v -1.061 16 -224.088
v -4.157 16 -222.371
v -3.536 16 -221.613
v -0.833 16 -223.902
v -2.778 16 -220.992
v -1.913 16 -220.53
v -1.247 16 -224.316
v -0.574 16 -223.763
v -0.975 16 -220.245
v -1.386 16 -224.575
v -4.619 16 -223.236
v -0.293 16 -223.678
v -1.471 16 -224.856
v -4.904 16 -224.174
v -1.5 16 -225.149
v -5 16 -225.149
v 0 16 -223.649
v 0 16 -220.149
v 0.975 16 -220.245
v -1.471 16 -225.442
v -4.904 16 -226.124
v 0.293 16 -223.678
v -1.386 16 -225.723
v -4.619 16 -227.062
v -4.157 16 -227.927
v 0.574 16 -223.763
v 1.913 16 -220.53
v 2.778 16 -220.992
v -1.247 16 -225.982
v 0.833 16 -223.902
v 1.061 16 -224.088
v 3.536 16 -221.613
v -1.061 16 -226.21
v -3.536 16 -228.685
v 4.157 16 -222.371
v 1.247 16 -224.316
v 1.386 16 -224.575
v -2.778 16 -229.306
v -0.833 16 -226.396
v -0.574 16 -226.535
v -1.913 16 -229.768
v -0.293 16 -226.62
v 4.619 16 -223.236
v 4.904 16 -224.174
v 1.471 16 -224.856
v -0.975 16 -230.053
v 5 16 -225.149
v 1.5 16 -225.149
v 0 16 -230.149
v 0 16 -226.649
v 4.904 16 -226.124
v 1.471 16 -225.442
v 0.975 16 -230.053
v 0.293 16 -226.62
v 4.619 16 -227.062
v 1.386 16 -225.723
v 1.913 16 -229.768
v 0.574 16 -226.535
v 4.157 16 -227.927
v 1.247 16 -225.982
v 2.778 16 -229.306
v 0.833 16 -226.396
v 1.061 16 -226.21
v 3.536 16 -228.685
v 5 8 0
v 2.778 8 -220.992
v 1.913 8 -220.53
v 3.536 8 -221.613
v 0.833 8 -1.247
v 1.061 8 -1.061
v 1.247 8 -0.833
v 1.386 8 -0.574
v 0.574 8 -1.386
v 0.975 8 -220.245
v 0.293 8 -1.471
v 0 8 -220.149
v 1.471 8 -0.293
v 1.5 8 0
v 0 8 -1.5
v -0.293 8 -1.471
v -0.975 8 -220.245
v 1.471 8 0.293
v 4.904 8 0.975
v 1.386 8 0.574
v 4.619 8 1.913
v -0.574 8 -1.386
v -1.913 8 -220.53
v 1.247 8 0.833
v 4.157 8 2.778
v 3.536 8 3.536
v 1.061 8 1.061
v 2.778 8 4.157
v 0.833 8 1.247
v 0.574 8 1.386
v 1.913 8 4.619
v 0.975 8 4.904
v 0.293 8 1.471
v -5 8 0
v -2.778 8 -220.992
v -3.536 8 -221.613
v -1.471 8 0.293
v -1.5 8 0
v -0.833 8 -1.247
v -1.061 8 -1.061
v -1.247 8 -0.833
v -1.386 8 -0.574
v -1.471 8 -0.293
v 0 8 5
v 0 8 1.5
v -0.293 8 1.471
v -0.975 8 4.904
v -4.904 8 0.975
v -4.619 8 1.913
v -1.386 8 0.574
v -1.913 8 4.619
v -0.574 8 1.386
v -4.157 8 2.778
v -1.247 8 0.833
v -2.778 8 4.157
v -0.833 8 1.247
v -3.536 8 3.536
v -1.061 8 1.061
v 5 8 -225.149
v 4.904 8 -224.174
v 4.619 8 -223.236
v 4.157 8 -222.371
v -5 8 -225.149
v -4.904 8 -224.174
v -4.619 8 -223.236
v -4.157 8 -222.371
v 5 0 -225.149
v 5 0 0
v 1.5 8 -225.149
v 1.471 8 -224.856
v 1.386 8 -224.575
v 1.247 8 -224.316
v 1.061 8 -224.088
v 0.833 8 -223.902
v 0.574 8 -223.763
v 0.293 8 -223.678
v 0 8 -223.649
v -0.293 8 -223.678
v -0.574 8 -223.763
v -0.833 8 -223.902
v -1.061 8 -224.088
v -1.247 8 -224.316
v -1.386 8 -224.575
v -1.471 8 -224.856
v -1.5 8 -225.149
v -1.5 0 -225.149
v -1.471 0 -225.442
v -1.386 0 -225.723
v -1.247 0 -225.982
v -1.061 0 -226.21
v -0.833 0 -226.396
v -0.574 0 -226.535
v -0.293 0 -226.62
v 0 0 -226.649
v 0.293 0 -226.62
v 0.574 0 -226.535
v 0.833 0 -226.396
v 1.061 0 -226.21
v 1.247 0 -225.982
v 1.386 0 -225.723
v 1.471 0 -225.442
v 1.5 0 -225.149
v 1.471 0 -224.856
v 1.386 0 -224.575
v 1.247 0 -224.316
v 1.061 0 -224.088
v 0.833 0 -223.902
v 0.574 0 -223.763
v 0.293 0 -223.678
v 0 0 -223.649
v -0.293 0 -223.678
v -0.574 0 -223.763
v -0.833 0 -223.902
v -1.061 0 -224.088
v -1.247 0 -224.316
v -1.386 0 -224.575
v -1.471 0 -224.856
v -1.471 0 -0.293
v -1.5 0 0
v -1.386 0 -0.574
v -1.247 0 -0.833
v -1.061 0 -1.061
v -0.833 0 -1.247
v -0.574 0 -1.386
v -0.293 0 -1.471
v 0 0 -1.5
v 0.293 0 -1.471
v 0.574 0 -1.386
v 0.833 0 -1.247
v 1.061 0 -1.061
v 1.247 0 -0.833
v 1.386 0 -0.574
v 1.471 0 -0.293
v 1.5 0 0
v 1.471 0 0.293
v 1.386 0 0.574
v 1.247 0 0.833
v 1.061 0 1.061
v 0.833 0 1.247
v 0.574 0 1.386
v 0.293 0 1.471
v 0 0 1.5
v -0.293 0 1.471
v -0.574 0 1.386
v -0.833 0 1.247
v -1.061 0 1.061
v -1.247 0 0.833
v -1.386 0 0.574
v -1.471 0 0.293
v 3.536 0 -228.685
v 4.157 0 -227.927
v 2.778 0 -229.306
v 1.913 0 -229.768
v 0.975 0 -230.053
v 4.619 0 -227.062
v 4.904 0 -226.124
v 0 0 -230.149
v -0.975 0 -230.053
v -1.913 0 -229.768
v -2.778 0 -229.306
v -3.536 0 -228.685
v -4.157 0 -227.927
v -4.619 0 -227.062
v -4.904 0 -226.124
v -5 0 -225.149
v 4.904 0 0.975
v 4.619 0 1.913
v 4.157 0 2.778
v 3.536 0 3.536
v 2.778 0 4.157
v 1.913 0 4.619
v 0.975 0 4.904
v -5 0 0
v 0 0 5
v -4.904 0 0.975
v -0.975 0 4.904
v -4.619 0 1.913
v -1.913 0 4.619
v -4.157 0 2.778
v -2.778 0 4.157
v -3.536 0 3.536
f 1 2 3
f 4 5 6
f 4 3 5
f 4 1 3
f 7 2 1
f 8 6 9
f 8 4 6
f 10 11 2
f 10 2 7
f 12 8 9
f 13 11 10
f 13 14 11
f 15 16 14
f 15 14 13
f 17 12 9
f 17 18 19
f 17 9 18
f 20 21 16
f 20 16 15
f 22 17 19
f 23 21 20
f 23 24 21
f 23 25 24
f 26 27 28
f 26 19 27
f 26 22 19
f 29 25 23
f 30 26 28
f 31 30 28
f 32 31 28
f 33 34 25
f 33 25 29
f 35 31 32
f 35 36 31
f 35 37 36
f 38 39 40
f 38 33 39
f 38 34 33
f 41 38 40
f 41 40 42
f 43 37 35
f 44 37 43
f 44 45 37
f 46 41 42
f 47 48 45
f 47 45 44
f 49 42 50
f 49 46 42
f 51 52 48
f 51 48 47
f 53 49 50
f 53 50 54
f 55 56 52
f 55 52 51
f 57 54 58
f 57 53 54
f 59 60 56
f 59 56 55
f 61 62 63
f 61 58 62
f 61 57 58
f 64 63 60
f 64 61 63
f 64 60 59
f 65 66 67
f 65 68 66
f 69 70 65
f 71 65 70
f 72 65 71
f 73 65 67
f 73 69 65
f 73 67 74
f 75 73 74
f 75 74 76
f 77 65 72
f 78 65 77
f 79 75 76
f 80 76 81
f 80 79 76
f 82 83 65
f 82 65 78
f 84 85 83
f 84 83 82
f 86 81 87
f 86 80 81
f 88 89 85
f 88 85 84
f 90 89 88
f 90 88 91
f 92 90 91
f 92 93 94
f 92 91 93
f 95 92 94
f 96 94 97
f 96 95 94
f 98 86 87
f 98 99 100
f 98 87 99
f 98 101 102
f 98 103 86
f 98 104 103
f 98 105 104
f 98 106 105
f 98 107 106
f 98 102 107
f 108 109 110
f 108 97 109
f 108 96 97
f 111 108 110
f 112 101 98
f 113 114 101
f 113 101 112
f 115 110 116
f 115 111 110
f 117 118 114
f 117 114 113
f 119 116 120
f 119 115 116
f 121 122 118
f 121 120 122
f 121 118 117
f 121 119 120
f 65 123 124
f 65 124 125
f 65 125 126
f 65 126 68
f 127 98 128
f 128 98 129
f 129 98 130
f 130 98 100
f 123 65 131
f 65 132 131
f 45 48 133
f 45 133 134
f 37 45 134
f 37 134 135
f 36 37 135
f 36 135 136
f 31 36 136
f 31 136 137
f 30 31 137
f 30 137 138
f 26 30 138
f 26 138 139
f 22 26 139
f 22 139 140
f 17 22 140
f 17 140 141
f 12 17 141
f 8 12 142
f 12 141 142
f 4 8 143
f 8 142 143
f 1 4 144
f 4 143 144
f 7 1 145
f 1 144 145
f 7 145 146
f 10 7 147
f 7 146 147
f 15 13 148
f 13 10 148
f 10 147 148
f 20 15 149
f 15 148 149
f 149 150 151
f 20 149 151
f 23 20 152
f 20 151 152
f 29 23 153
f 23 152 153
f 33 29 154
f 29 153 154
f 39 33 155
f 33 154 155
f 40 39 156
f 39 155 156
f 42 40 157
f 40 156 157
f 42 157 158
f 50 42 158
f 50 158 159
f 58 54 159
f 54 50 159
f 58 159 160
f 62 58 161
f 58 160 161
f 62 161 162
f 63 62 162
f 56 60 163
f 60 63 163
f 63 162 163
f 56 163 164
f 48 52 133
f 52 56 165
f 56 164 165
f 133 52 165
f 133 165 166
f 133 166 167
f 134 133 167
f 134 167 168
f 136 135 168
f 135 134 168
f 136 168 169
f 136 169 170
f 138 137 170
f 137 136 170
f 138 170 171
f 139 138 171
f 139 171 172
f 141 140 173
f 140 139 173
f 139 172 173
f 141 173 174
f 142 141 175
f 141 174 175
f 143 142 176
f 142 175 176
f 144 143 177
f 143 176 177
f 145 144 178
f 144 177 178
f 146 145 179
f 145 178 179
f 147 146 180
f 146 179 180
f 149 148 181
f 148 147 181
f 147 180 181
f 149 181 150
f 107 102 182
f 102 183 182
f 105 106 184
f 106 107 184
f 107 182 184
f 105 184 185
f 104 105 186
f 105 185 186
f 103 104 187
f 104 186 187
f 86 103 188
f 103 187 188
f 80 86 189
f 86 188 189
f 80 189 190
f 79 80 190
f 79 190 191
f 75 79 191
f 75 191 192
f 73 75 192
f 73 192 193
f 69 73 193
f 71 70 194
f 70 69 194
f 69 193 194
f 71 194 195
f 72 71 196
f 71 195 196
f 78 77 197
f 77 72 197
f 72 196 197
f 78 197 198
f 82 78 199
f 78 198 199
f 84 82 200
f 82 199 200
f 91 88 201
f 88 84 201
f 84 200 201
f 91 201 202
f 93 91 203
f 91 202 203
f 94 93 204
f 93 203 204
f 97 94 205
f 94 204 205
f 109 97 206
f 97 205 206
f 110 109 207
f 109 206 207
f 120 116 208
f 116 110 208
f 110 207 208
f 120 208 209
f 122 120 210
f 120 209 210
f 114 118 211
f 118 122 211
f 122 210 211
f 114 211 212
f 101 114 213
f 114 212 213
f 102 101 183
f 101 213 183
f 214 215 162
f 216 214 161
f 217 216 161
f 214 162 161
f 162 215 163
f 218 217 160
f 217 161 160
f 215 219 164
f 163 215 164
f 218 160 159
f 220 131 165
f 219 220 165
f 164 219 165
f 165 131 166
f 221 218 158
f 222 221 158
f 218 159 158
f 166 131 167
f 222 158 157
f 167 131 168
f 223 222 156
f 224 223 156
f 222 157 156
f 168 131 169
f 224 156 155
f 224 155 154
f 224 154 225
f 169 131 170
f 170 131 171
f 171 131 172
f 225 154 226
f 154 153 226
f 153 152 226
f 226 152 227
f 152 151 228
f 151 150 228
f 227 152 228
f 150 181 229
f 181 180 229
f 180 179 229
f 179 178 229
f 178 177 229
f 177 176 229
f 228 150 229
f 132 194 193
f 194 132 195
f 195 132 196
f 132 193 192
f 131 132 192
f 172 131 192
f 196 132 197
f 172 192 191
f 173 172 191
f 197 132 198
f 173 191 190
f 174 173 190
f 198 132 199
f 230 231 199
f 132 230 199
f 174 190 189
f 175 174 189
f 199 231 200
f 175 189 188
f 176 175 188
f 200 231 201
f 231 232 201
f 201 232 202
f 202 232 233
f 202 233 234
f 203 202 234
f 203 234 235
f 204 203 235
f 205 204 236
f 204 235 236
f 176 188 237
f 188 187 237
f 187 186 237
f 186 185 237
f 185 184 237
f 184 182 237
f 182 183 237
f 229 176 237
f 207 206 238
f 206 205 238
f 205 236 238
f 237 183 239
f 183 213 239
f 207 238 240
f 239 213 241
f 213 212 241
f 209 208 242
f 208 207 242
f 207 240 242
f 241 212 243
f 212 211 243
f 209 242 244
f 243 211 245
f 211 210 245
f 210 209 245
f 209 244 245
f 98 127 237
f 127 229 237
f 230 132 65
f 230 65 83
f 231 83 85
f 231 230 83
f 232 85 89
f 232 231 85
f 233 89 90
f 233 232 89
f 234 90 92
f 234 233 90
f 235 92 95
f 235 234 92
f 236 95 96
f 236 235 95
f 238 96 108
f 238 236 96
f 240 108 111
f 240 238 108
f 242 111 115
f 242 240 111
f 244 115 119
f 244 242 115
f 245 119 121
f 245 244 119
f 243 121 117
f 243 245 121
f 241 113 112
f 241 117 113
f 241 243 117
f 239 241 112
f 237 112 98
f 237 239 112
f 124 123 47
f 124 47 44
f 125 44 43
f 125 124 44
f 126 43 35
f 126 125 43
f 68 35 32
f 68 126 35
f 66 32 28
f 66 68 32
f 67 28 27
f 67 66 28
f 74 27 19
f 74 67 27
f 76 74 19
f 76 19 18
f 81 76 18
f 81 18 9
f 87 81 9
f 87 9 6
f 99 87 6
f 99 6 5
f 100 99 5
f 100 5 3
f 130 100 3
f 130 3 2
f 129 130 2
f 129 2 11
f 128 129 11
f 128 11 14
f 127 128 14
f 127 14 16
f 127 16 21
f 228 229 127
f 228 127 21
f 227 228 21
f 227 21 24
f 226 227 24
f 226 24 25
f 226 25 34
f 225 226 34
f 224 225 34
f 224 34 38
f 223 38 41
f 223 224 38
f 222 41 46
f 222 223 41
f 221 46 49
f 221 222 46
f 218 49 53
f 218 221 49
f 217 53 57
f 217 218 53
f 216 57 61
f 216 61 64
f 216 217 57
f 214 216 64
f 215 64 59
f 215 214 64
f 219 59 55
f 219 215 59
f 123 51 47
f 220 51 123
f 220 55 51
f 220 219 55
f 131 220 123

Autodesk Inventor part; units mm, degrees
ref_plane "YZ Plane" through (0, 0, 0) normal (1, 0, 0) x (0, 1, 0)
ref_plane "XZ Plane" through (0, 0, 0) normal (0, 1, 0) x (-1, 0, 0)
ref_plane "XY Plane" through (0, 0, 0) normal (0, 0, 1) x (1, 0, 0)
sketch "Sketch1" plane through (0, 0, 0) normal (0, 1, 0) x (-1, 0, 0)
  line L0 (0, 0) -> (0, -225.149) construction
  line L1 (-5, 0) -> (-5, -225.149)
  line L2 (5, -225.149) -> (5, 0)
  arc A0 (5, 0) -> (-5, 0) centre (0, 0) ccw
  arc A1 (-5, -225.149) -> (5, -225.149) centre (0, -225.149) ccw
  circle A2 centre (0, 0) radius 1.5
  circle A3 centre (0, -225.149) radius 1.5
  point P0 (0, -112.5745)
  dimension "d0" = 225.149
  dimension "d1" = 10
  dimension "d2" = 3
  dimension "d3" = 3
extrude "Extrusion1" add sketch "Sketch1" along normal blind 8
sketch "Sketch2" plane through (0, 8, 0) normal (0, 1, 0) x (1, 0, 0)
  arc A0 (5, 225.149) -> (-5, 225.149) centre (0, 225.149) ccw projected
  line L0 (-5, 225.149) -> (-5, 0) projected
  arc A1 (-5, 0) -> (5, 0) centre (0, 0) ccw projected
  line L1 (5, 0) -> (5, 225.149) projected
  circle A2 centre (0, 225.149) radius 1.5 projected
  circle A3 centre (0, 0) radius 1.5 projected
  circle A4 centre (0, 225.149) radius 5
  point P0 (-5, 225.149)
  point P1 (5, 225.149)
  dimension "d12" = 10
extrude "Extrusion2" add sketch "Sketch2" along normal blind 8 contours A4 A0
sketch "Sketch3" plane through (0, 0, 0) normal (0, -1, 0) x (1, 0, 0)
  arc A0 (-5, -225.149) -> (5, -225.149) centre (0, -225.149) ccw projected
  line L0 (5, 0) -> (5, -225.149) projected
  arc A1 (5, 0) -> (-5, 0) centre (0, 0) ccw projected
  line L1 (-5, -225.149) -> (-5, 0) projected
  circle A2 centre (0, -225.149) radius 1.5 projected
  circle A3 centre (0, 0) radius 1.5 projected
